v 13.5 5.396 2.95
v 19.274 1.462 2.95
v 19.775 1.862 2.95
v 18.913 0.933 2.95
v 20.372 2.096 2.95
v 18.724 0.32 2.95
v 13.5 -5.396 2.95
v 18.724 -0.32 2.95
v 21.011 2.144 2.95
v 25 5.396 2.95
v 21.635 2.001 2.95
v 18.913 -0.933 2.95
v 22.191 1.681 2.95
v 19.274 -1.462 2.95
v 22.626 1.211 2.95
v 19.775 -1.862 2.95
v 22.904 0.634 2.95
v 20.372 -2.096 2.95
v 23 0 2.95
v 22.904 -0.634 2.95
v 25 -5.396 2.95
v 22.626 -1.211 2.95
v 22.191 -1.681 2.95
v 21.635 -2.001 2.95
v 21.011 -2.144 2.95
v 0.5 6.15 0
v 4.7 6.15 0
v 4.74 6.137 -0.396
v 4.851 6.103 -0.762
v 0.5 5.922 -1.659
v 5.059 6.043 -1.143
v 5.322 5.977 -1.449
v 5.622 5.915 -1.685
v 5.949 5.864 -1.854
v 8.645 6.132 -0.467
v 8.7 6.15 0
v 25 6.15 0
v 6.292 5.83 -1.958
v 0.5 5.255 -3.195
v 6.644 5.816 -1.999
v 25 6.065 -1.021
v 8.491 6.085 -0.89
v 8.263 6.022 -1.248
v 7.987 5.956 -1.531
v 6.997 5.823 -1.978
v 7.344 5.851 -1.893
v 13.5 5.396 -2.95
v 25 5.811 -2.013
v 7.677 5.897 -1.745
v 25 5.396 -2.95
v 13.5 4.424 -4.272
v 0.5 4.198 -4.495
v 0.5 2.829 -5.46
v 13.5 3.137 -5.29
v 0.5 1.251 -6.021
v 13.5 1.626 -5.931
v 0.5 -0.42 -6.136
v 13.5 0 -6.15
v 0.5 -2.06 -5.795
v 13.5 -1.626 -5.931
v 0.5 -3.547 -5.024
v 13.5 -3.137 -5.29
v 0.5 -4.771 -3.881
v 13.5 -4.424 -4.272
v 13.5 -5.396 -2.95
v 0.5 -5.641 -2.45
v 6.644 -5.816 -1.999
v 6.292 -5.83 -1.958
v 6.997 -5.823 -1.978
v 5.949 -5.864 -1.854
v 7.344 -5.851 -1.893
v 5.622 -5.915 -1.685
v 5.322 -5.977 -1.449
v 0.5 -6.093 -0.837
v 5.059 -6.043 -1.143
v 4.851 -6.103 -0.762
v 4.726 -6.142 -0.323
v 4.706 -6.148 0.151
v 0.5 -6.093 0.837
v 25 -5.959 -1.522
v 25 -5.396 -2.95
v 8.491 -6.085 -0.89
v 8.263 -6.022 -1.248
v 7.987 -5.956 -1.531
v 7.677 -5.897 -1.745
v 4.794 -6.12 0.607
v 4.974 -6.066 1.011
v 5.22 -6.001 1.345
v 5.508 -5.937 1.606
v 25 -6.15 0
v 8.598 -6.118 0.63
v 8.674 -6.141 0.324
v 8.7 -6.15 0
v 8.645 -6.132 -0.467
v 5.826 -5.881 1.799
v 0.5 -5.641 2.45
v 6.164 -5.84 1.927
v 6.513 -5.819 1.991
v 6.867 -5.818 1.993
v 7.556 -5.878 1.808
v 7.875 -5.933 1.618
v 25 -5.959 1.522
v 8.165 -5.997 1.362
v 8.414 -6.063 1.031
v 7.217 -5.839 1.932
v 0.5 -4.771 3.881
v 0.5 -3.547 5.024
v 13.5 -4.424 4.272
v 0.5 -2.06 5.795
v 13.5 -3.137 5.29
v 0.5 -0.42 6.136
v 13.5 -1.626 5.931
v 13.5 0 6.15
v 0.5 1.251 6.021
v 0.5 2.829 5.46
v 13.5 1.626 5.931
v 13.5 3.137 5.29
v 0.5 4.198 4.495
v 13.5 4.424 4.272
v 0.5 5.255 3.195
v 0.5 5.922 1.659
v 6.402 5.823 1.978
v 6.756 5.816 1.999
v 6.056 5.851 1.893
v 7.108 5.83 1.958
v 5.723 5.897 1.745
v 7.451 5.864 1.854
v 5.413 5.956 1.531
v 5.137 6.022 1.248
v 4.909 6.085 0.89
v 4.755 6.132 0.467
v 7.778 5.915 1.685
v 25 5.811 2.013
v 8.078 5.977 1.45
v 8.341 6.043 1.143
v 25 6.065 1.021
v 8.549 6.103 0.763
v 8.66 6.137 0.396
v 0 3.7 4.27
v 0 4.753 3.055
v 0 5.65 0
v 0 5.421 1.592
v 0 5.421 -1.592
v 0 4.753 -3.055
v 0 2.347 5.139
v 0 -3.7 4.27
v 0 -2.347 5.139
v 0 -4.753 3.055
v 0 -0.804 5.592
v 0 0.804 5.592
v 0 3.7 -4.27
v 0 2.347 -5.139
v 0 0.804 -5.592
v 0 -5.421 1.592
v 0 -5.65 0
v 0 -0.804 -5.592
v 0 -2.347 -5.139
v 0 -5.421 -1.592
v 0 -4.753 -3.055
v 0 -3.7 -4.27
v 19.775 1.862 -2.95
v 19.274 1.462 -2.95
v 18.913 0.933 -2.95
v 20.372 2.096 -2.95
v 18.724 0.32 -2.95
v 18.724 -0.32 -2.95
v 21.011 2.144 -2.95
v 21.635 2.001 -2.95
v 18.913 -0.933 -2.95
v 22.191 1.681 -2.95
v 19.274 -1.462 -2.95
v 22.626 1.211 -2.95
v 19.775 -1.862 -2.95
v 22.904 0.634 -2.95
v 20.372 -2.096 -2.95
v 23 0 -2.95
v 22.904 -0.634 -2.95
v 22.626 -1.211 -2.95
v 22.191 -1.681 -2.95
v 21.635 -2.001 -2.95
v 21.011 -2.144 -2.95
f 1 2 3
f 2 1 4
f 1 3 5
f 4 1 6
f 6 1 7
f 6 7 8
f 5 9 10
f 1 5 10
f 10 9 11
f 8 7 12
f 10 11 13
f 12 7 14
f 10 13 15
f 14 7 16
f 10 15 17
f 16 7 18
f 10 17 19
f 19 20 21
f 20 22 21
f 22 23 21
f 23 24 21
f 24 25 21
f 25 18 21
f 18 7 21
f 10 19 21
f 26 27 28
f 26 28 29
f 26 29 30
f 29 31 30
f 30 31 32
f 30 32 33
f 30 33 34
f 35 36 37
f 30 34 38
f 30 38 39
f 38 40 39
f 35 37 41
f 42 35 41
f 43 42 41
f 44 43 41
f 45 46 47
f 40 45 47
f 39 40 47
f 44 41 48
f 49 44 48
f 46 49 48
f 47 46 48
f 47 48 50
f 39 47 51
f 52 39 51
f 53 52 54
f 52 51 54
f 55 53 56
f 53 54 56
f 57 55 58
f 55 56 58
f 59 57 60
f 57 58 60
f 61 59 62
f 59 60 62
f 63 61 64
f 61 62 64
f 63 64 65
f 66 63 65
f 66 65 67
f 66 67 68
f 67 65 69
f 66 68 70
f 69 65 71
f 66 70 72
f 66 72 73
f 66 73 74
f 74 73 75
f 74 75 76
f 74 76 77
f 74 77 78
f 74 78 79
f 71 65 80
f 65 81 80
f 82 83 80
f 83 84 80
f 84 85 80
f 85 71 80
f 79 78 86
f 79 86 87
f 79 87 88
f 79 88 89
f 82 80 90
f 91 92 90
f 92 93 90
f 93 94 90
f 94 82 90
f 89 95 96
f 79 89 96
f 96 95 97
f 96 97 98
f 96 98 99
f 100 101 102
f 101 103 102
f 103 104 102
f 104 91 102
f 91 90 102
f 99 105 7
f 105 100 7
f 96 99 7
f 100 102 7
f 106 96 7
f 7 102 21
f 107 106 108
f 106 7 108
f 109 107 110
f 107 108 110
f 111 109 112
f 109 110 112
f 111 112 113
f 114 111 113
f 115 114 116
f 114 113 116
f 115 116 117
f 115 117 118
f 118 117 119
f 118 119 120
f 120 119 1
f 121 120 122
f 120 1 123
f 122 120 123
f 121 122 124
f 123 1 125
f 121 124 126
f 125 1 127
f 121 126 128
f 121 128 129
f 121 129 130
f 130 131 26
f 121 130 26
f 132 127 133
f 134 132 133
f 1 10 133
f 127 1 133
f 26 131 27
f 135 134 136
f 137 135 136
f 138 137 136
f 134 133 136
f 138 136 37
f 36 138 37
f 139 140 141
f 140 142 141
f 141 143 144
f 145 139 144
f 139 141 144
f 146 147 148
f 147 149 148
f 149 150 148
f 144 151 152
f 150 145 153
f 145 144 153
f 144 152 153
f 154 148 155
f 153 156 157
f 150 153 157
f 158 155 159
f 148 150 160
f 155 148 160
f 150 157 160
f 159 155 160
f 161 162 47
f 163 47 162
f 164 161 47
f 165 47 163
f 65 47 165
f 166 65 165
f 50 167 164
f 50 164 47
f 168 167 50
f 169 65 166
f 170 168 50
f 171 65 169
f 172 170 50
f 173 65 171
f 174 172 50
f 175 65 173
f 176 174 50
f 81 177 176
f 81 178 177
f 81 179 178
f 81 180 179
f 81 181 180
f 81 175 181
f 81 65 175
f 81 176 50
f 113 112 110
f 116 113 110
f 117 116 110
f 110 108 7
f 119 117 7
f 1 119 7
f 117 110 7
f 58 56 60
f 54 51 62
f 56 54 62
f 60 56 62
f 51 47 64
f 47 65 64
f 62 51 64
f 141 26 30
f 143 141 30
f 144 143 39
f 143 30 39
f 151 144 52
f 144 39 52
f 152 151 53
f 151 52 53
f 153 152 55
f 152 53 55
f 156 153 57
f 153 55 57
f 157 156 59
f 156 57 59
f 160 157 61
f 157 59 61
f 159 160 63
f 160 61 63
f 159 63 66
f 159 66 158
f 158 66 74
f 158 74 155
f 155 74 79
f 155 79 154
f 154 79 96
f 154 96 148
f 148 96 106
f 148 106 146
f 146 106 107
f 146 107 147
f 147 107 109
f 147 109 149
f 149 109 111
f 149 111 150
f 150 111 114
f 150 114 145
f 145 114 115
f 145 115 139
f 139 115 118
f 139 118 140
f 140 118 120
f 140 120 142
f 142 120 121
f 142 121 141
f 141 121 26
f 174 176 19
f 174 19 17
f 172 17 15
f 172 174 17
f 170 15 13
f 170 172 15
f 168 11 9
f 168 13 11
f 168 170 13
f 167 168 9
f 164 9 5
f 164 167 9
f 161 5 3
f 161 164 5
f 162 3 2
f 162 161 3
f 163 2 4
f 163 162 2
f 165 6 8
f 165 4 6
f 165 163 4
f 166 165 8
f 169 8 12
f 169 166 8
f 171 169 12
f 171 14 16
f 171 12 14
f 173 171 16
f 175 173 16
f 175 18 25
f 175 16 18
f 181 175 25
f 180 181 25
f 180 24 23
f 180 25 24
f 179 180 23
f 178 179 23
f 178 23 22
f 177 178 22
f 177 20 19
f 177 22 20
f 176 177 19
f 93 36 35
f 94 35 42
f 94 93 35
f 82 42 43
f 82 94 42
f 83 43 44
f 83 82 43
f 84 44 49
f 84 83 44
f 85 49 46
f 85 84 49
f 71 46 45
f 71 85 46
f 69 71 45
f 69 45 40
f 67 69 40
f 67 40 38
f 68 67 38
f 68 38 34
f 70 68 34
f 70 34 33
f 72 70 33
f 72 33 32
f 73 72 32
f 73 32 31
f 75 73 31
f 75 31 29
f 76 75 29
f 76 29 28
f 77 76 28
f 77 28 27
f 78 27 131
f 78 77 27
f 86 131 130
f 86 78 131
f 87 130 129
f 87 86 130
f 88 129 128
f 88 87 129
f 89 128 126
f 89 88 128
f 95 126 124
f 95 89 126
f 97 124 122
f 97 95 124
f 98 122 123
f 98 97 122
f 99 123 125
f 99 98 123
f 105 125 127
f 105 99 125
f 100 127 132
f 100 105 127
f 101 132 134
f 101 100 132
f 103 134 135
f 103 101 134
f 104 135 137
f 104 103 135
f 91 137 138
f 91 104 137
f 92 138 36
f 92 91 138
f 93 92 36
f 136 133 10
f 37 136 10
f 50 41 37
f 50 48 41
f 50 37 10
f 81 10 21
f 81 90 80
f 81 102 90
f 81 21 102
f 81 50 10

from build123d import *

# Parameters (mm, degrees)
SKETCH1_W               = 25
SKETCH1_H               = 6.15
CHAMFER1_SIZE           = 0.5
CUT_EXTRUDE1_DEPTH      = 27.469699658
CUT_EXTRUDE1_DEPTH_BACK = 27.469699658
SKETCH3_R               = 2
CUT_EXTRUDE3_DEPTH      = 27.469699799
CUT_EXTRUDE3_DEPTH_BACK = 27.469699799
SKETCH6_W               = 11.5
SKETCH6_H               = 3.2
CUT_EXTRUDE4_DEPTH      = 27.469699799
CUT_EXTRUDE4_DEPTH_BACK = 27.469699799
SKETCH11_R              = 2.15


with BuildPart() as part:
    # Sketch1 → Revolve1 (revolve)
    with BuildSketch(Plane.XY):
        with Locations((12.5, 3.075)):
            Rectangle(SKETCH1_W, SKETCH1_H)
    revolve(axis=Axis((25, 0, 0), (-1, 0, 0)))

    # Chamfer1
    chamfer1_edges = [part.edges().sort_by_distance(p)[0] for p in [
        (0, -6.15, 0),
    ]]
    chamfer(chamfer1_edges, length=CHAMFER1_SIZE)

    # Sketch3 → Cut-Extrude1 (cut, two sides: drawn at the far end of the back side and taken through both)
    with BuildSketch(Plane(origin=(0, 0, 0), x_dir=(1, 0, 0), z_dir=(0, 1, 0)).offset(-CUT_EXTRUDE1_DEPTH_BACK)):
        with Locations((6.7, 0)):
            Circle(SKETCH3_R)
    extrude(amount=CUT_EXTRUDE1_DEPTH + CUT_EXTRUDE1_DEPTH_BACK, mode=Mode.SUBTRACT)

    # Sketch6 → Cut-Extrude3 (cut, two sides: drawn at the far end of the back side and taken through both)
    with BuildSketch(Plane(origin=(0, 0, 0), x_dir=(1, 0, 0), z_dir=(0, 1, 0)).offset(-CUT_EXTRUDE3_DEPTH_BACK)):
        with Locations((19.25, -4.55)):
            Rectangle(SKETCH6_W, SKETCH6_H)
        with Locations((19.25, 4.55)):
            Rectangle(SKETCH6_W, SKETCH6_H)
    extrude(amount=CUT_EXTRUDE3_DEPTH + CUT_EXTRUDE3_DEPTH_BACK, mode=Mode.SUBTRACT)

    # Sketch11 → Cut-Extrude4 (cut, two sides: drawn at the far end of the back side and taken through both)
    with BuildSketch(Plane.XY.offset(-CUT_EXTRUDE4_DEPTH_BACK)):
        with Locations((20.85, 0)):
            Circle(SKETCH11_R)
    extrude(amount=CUT_EXTRUDE4_DEPTH + CUT_EXTRUDE4_DEPTH_BACK, mode=Mode.SUBTRACT)


solid = part.part
